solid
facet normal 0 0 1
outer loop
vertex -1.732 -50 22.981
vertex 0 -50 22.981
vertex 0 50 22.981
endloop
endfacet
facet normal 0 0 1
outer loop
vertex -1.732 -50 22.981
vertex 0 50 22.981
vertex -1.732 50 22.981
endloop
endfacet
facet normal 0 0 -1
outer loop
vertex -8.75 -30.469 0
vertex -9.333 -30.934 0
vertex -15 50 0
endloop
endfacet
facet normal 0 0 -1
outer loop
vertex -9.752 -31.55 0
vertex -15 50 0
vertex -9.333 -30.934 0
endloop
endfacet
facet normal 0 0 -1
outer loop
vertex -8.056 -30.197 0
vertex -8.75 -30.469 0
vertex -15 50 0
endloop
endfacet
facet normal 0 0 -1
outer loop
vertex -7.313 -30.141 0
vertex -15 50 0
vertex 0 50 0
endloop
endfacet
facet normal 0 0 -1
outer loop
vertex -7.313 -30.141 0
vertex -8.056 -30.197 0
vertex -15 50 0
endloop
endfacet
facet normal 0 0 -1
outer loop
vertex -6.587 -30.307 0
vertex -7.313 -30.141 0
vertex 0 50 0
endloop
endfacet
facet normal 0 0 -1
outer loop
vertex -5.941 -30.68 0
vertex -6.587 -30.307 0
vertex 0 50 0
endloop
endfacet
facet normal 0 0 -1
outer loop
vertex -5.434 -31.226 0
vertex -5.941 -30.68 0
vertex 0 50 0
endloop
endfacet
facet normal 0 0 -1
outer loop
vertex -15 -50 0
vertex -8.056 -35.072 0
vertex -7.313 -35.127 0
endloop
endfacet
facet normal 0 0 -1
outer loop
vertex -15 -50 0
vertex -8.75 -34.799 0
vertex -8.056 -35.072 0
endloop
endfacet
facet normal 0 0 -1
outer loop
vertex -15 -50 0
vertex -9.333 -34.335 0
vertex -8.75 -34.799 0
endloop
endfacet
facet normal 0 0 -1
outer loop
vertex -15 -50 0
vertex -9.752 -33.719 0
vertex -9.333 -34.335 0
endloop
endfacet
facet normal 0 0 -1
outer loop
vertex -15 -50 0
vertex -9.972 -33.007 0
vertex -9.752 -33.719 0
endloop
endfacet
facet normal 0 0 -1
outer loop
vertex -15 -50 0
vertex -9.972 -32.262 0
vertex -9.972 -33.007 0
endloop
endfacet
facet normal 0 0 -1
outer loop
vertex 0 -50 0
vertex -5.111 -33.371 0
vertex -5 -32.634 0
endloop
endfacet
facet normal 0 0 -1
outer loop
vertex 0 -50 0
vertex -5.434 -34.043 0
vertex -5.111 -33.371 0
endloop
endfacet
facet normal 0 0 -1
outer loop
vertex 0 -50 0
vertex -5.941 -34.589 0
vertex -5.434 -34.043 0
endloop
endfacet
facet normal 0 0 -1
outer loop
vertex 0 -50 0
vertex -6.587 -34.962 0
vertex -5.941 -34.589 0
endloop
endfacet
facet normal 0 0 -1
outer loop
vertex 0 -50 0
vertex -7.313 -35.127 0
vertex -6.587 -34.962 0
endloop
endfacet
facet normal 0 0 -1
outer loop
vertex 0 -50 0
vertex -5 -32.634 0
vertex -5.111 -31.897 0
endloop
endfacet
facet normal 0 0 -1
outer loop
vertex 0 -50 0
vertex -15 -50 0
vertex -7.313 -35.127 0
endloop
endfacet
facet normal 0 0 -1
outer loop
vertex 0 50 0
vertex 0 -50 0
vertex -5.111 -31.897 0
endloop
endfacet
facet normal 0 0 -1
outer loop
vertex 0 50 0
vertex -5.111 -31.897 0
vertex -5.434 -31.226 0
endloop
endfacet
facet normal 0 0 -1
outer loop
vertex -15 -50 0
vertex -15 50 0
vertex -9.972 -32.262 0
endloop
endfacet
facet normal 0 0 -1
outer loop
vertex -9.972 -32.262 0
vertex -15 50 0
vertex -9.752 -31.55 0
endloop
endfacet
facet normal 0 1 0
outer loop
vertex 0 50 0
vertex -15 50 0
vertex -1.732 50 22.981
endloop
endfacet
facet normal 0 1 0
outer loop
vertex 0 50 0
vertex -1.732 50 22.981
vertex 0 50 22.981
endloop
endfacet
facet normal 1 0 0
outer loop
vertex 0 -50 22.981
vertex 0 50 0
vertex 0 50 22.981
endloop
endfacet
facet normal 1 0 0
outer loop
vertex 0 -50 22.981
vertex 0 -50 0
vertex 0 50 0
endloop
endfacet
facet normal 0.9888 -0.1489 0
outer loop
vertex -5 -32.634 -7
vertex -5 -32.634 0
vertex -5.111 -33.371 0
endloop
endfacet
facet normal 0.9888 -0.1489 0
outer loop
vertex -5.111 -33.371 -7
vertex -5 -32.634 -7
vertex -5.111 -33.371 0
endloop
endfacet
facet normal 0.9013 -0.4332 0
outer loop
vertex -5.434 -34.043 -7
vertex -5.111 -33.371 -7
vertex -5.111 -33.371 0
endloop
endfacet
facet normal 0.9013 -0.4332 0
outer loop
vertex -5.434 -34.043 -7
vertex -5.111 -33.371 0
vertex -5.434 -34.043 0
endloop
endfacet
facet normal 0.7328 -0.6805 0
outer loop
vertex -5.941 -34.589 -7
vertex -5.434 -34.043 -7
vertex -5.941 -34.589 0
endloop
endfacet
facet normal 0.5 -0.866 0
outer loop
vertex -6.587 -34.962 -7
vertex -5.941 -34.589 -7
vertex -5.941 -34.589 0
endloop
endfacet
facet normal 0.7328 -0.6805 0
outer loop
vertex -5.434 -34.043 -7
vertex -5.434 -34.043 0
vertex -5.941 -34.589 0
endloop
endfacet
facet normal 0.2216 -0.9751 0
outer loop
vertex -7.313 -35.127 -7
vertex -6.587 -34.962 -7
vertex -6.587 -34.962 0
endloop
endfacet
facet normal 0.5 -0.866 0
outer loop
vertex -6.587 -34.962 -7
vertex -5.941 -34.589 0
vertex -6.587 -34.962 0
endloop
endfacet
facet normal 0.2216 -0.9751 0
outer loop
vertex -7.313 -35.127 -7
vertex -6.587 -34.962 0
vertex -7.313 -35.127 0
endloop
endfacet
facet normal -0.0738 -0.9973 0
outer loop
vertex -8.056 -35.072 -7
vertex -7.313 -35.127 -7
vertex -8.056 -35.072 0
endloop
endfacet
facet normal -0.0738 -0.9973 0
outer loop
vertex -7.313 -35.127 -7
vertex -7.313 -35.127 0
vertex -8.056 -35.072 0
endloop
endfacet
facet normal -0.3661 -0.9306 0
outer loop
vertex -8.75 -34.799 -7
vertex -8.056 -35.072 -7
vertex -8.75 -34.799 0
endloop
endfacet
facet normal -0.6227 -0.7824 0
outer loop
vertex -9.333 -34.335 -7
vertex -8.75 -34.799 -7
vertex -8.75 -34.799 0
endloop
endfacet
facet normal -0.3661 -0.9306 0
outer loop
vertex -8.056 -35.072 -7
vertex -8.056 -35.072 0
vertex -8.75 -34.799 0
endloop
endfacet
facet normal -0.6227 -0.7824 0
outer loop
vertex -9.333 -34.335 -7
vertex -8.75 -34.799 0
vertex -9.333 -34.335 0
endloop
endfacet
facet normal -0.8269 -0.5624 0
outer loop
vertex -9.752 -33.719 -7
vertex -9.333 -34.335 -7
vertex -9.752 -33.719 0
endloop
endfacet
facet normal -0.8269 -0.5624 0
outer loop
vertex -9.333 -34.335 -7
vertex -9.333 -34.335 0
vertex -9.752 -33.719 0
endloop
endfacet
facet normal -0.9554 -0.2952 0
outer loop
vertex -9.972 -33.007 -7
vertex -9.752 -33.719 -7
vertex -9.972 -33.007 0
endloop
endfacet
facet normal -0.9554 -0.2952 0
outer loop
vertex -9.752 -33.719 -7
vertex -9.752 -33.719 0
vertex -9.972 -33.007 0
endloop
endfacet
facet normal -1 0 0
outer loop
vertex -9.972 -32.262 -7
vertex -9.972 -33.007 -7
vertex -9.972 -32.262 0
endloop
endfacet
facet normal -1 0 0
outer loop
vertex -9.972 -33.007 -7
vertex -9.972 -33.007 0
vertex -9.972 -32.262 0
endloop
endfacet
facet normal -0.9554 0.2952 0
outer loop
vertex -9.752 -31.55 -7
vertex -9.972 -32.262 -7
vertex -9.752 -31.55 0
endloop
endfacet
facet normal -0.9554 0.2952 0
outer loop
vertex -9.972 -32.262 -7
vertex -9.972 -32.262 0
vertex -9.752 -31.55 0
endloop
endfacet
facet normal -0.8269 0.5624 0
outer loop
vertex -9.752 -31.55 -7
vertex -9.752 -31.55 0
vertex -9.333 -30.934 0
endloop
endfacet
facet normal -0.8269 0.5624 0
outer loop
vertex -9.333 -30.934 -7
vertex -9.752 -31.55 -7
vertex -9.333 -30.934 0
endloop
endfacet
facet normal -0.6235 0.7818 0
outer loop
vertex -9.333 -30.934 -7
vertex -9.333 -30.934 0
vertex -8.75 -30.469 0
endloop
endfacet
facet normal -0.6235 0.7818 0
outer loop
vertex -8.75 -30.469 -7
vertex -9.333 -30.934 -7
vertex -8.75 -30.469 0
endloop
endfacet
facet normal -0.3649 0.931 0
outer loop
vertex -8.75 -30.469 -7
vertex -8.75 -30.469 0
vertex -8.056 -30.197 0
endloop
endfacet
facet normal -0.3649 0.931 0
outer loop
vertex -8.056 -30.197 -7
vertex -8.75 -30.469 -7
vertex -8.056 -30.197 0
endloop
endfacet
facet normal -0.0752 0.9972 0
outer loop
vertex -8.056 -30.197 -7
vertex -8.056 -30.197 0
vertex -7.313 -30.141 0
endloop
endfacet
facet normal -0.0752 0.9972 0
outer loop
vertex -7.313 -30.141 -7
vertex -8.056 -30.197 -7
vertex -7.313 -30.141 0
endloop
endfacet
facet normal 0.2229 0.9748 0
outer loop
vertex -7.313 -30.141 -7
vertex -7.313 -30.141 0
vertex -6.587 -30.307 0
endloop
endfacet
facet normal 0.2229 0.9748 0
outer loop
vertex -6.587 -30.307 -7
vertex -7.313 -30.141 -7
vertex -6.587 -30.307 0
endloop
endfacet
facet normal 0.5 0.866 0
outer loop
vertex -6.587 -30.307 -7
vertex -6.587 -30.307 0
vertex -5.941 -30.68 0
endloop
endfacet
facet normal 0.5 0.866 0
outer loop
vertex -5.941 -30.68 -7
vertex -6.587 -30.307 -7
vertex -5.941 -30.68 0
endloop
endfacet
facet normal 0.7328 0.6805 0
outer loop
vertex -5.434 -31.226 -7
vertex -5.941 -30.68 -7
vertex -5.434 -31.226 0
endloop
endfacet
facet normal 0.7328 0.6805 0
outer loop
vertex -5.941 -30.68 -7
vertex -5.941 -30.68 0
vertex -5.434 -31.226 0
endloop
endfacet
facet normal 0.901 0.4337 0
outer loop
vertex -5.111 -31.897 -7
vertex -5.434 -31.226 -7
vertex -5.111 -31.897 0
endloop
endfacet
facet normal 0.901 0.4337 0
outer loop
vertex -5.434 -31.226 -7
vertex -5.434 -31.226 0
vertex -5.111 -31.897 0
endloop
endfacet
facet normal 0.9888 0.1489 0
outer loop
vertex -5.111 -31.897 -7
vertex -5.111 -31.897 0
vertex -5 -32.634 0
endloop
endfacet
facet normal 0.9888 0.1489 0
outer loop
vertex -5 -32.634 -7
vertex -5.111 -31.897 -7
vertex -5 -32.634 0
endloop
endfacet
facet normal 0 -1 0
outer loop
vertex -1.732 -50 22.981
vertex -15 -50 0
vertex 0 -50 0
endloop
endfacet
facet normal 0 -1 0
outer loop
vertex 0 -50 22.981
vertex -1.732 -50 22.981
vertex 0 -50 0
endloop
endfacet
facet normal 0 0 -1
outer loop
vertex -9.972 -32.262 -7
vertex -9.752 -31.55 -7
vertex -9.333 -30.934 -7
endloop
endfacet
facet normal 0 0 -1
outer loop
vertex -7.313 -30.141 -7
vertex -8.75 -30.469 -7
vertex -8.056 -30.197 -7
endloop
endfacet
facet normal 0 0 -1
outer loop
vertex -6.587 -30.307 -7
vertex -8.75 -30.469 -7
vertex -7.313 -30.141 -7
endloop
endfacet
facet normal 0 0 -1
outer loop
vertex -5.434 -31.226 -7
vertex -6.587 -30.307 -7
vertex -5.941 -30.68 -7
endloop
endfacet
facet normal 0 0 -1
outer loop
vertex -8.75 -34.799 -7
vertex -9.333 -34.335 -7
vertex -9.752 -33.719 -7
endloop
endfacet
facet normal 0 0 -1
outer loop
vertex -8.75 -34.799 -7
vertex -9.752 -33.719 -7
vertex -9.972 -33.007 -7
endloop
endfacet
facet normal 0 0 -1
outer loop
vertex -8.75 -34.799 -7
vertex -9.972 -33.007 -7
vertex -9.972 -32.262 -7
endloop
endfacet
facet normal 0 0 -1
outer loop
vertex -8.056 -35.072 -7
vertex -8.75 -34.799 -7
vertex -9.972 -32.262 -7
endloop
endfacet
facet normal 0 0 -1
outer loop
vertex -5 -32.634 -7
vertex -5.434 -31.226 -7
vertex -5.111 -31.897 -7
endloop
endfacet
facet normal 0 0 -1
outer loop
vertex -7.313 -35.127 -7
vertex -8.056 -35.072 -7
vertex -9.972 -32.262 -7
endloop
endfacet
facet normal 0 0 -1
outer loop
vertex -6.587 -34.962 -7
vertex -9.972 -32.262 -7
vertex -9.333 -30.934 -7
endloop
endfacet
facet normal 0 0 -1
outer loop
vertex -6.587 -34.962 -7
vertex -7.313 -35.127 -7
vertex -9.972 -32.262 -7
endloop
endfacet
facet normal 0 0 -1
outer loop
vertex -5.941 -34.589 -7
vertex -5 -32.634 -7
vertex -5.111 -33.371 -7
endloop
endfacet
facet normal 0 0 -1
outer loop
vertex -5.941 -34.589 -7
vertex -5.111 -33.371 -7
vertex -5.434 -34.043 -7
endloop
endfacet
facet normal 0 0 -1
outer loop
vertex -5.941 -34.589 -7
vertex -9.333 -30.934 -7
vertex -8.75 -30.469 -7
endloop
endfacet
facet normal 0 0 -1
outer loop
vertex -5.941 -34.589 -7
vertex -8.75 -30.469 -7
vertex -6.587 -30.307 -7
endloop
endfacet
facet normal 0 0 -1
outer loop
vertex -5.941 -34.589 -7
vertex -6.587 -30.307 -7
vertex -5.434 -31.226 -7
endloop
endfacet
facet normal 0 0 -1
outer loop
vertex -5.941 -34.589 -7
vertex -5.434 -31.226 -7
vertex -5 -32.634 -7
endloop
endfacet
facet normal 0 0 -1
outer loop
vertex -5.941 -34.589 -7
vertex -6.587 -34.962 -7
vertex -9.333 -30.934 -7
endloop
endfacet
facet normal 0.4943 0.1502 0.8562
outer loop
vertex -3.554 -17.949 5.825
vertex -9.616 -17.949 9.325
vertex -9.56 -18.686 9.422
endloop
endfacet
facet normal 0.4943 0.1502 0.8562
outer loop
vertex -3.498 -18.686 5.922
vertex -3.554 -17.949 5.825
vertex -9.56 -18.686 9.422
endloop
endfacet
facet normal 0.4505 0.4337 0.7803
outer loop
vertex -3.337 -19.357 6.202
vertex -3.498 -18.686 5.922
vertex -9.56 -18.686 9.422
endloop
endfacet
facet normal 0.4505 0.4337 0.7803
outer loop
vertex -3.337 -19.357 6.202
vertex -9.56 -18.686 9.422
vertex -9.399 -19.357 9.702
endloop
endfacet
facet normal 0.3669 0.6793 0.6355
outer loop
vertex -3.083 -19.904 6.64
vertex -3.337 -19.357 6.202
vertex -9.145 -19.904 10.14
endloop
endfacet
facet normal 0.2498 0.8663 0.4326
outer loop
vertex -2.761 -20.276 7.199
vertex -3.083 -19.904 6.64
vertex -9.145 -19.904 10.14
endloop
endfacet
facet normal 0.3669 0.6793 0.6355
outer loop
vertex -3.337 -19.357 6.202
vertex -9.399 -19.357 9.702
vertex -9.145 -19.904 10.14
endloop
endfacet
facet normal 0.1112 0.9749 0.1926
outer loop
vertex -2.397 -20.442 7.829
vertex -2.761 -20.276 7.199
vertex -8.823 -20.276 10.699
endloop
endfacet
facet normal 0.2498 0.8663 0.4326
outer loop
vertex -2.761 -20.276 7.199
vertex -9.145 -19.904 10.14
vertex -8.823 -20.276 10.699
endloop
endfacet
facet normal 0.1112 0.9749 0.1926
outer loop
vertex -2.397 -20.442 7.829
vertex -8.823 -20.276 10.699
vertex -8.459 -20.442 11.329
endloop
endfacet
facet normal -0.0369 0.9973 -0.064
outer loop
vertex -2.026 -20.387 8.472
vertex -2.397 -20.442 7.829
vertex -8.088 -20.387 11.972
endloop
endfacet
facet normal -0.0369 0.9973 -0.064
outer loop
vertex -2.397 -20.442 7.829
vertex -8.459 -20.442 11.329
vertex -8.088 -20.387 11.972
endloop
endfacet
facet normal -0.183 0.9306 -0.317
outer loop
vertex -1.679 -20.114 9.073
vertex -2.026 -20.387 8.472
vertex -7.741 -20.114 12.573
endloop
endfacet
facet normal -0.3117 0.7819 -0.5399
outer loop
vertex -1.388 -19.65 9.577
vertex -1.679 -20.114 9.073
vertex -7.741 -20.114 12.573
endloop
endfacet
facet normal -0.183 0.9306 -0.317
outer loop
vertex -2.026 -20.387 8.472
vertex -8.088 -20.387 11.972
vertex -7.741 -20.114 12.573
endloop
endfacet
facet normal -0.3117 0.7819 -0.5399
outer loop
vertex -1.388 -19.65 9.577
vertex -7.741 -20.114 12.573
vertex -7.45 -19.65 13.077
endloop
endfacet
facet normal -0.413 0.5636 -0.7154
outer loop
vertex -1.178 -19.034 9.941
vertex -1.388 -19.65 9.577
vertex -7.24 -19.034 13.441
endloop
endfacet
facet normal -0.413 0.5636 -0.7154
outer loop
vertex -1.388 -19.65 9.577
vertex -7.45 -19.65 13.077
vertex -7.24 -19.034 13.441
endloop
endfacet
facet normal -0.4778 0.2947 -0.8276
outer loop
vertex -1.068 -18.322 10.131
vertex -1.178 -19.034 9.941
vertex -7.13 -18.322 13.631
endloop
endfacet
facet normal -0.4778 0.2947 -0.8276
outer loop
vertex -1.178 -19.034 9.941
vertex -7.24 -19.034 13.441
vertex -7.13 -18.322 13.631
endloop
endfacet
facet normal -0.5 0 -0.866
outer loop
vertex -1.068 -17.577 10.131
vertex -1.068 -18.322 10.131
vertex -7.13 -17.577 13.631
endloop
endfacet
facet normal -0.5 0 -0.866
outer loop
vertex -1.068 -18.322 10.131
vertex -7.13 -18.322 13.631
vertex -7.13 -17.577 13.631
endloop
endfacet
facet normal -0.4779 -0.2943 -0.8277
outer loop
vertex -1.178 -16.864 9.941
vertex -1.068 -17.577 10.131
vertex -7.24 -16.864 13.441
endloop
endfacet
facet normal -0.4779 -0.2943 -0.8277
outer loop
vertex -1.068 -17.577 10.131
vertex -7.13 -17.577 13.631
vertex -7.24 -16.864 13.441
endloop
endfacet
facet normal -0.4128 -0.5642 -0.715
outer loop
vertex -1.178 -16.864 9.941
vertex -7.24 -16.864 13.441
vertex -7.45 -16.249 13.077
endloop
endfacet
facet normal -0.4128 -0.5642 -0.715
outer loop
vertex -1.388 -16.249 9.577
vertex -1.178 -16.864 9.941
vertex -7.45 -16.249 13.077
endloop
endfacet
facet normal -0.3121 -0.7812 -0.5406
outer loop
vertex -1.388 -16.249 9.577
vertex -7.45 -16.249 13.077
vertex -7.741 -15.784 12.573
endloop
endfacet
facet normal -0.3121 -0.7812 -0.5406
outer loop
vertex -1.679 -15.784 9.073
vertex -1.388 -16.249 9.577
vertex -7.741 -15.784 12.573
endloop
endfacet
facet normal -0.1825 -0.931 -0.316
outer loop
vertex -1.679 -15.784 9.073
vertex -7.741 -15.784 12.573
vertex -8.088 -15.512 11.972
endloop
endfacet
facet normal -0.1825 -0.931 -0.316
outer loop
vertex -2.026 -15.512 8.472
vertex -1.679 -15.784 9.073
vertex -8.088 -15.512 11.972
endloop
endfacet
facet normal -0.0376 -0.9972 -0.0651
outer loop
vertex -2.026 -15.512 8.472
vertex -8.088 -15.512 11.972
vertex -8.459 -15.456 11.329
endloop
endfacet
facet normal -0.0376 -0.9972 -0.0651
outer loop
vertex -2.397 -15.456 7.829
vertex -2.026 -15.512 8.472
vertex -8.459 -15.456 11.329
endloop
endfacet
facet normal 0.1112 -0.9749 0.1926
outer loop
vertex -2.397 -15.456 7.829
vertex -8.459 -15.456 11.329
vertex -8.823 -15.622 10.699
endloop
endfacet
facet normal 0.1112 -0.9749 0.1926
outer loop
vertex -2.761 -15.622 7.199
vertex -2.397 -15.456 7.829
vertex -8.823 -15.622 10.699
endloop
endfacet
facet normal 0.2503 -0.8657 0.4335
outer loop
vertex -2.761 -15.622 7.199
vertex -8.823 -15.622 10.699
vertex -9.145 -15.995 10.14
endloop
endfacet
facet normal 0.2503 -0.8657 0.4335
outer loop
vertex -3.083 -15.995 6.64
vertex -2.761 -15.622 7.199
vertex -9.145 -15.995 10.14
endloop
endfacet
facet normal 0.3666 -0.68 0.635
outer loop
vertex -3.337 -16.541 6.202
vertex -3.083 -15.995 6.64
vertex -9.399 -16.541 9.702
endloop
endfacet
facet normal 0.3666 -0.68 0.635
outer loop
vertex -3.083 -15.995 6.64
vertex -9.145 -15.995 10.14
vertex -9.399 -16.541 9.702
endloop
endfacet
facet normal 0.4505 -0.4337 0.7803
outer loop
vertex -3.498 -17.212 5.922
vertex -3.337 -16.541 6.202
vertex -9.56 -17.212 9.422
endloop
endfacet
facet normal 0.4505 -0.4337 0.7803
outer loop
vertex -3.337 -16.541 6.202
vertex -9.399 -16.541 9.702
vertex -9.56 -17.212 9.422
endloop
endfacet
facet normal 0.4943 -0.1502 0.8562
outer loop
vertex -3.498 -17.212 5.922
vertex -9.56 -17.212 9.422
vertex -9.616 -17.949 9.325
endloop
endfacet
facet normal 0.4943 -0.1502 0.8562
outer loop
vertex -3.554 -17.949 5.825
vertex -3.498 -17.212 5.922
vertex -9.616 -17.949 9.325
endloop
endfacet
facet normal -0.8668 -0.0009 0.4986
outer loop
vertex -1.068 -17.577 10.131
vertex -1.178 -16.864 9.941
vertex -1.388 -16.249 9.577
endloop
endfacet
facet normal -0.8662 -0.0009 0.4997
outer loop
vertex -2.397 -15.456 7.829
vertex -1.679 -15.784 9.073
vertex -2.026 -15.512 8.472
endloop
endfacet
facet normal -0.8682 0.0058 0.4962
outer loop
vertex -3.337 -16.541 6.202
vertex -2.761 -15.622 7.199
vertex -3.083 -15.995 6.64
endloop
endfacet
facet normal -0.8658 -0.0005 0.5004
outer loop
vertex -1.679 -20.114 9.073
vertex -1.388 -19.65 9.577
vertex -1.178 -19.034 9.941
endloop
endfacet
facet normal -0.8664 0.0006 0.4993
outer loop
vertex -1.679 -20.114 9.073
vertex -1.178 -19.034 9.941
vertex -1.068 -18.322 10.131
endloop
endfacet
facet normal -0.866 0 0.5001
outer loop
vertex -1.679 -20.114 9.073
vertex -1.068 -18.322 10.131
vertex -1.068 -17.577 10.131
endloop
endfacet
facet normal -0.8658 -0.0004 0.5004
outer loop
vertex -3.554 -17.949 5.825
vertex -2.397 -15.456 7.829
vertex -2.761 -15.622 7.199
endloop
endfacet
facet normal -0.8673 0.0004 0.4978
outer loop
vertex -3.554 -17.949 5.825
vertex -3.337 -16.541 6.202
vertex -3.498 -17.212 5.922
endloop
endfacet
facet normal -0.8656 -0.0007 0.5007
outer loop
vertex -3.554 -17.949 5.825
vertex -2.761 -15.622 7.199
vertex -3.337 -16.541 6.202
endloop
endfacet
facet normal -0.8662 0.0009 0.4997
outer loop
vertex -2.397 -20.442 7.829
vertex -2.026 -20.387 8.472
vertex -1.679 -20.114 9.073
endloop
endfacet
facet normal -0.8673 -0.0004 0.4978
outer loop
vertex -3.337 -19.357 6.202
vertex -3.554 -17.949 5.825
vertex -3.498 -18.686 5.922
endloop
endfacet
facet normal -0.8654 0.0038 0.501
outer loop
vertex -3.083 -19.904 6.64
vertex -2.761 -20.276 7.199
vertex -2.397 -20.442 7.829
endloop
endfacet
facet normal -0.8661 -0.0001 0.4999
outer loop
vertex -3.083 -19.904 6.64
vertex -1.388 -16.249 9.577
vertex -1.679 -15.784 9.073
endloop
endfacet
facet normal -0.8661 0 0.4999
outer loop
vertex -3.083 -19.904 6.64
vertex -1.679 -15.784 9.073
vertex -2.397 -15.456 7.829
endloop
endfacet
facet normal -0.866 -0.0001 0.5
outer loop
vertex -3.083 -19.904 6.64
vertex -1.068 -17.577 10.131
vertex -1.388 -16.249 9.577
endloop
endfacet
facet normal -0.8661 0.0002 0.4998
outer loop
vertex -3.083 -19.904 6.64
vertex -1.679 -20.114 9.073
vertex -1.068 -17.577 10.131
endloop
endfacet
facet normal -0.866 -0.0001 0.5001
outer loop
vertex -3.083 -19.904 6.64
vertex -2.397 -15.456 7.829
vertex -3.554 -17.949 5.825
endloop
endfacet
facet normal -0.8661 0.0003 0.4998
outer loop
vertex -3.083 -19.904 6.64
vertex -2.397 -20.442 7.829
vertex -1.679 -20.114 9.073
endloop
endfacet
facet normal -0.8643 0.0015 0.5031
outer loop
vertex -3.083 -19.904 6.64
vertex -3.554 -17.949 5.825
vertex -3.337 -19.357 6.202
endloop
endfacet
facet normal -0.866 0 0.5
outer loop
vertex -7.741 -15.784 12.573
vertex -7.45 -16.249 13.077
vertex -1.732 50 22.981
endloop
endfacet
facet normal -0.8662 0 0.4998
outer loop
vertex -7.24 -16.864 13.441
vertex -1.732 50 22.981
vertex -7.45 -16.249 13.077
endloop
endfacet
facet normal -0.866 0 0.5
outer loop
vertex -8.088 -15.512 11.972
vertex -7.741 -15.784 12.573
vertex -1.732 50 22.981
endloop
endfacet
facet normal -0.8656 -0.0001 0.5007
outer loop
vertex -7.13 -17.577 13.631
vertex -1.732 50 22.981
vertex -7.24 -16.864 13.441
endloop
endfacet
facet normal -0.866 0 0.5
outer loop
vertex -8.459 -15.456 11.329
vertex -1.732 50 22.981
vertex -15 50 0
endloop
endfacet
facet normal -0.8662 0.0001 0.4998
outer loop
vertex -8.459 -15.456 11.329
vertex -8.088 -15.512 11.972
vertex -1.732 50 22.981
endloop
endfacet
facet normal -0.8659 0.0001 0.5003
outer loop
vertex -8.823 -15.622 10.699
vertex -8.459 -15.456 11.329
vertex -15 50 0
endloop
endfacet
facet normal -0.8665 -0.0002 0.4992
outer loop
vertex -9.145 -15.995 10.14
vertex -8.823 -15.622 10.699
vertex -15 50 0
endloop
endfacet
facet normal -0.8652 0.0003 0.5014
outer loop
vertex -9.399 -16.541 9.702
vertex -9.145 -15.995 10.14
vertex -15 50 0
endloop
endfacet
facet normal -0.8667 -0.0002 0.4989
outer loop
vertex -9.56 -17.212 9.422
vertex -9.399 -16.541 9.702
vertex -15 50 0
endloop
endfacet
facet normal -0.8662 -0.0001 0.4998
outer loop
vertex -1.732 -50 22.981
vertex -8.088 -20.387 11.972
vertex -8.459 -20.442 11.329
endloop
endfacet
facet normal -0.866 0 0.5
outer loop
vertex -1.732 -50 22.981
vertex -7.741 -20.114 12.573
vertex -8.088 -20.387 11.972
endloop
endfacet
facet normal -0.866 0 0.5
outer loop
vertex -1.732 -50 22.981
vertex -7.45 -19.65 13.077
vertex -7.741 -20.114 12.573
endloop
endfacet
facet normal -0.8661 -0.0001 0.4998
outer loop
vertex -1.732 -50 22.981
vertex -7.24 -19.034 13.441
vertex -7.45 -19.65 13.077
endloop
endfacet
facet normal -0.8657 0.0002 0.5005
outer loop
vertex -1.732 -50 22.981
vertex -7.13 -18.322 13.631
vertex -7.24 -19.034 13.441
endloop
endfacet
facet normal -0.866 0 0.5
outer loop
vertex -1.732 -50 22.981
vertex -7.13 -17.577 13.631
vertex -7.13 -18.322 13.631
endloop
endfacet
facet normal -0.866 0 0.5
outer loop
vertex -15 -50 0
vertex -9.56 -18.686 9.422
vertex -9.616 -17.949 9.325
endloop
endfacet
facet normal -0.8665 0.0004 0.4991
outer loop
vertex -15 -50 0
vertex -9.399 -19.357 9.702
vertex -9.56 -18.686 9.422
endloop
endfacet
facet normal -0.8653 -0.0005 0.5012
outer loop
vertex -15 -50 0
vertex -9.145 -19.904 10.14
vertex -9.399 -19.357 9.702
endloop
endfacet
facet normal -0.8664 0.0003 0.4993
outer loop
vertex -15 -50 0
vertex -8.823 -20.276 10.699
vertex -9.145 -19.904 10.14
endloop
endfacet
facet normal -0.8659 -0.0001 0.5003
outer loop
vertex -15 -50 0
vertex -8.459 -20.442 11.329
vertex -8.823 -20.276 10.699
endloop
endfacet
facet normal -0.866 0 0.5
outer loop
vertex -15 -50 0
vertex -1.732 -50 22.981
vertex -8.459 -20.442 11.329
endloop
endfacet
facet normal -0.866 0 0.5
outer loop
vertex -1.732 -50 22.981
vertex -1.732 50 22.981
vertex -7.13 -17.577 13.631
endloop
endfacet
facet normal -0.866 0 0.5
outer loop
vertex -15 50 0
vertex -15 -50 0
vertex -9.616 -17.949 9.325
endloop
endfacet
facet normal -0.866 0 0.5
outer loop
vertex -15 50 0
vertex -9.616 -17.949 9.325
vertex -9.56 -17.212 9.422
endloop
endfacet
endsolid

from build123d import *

# Parameters (mm, degrees)
PAD_DEPTH    = 50
SKETCH001_R  = 2.5
PAD001_DEPTH = 7
SKETCH002_R  = 2.5
POCKET_DEPTH = 7


with BuildPart() as part:
    # Sketch → Pad (new body, symmetric)
    with BuildSketch(Plane.XZ):
        Polygon((0, 0), (0, 22.9807621135), (-1.7320508076, 22.9807621135), (-15, 0), align=None)
    extrude(amount=PAD_DEPTH, both=True)

    # Sketch001 (on DatumPlane) → Pad001 (join)
    with BuildSketch(Plane(origin=(0, 0, 0), x_dir=(1, 0, 0), z_dir=(0, 0, -1))):
        with Locations((-7.5, 32.6343382758)):
            Circle(SKETCH001_R)
    extrude(amount=PAD001_DEPTH)

    # Sketch002 (on Face6 of Pad001) → Pocket (cut)
    with BuildSketch(Plane(origin=(-11.25, 0, 6.4951905284), x_dir=(-0.5, 0, -0.8660254038), z_dir=(-0.8660254038, 0, 0.5))):
        with Locations((-5.7679491924, 17.9491805705)):
            Circle(SKETCH002_R)
    extrude(amount=-POCKET_DEPTH, mode=Mode.SUBTRACT)


solid = part.part
